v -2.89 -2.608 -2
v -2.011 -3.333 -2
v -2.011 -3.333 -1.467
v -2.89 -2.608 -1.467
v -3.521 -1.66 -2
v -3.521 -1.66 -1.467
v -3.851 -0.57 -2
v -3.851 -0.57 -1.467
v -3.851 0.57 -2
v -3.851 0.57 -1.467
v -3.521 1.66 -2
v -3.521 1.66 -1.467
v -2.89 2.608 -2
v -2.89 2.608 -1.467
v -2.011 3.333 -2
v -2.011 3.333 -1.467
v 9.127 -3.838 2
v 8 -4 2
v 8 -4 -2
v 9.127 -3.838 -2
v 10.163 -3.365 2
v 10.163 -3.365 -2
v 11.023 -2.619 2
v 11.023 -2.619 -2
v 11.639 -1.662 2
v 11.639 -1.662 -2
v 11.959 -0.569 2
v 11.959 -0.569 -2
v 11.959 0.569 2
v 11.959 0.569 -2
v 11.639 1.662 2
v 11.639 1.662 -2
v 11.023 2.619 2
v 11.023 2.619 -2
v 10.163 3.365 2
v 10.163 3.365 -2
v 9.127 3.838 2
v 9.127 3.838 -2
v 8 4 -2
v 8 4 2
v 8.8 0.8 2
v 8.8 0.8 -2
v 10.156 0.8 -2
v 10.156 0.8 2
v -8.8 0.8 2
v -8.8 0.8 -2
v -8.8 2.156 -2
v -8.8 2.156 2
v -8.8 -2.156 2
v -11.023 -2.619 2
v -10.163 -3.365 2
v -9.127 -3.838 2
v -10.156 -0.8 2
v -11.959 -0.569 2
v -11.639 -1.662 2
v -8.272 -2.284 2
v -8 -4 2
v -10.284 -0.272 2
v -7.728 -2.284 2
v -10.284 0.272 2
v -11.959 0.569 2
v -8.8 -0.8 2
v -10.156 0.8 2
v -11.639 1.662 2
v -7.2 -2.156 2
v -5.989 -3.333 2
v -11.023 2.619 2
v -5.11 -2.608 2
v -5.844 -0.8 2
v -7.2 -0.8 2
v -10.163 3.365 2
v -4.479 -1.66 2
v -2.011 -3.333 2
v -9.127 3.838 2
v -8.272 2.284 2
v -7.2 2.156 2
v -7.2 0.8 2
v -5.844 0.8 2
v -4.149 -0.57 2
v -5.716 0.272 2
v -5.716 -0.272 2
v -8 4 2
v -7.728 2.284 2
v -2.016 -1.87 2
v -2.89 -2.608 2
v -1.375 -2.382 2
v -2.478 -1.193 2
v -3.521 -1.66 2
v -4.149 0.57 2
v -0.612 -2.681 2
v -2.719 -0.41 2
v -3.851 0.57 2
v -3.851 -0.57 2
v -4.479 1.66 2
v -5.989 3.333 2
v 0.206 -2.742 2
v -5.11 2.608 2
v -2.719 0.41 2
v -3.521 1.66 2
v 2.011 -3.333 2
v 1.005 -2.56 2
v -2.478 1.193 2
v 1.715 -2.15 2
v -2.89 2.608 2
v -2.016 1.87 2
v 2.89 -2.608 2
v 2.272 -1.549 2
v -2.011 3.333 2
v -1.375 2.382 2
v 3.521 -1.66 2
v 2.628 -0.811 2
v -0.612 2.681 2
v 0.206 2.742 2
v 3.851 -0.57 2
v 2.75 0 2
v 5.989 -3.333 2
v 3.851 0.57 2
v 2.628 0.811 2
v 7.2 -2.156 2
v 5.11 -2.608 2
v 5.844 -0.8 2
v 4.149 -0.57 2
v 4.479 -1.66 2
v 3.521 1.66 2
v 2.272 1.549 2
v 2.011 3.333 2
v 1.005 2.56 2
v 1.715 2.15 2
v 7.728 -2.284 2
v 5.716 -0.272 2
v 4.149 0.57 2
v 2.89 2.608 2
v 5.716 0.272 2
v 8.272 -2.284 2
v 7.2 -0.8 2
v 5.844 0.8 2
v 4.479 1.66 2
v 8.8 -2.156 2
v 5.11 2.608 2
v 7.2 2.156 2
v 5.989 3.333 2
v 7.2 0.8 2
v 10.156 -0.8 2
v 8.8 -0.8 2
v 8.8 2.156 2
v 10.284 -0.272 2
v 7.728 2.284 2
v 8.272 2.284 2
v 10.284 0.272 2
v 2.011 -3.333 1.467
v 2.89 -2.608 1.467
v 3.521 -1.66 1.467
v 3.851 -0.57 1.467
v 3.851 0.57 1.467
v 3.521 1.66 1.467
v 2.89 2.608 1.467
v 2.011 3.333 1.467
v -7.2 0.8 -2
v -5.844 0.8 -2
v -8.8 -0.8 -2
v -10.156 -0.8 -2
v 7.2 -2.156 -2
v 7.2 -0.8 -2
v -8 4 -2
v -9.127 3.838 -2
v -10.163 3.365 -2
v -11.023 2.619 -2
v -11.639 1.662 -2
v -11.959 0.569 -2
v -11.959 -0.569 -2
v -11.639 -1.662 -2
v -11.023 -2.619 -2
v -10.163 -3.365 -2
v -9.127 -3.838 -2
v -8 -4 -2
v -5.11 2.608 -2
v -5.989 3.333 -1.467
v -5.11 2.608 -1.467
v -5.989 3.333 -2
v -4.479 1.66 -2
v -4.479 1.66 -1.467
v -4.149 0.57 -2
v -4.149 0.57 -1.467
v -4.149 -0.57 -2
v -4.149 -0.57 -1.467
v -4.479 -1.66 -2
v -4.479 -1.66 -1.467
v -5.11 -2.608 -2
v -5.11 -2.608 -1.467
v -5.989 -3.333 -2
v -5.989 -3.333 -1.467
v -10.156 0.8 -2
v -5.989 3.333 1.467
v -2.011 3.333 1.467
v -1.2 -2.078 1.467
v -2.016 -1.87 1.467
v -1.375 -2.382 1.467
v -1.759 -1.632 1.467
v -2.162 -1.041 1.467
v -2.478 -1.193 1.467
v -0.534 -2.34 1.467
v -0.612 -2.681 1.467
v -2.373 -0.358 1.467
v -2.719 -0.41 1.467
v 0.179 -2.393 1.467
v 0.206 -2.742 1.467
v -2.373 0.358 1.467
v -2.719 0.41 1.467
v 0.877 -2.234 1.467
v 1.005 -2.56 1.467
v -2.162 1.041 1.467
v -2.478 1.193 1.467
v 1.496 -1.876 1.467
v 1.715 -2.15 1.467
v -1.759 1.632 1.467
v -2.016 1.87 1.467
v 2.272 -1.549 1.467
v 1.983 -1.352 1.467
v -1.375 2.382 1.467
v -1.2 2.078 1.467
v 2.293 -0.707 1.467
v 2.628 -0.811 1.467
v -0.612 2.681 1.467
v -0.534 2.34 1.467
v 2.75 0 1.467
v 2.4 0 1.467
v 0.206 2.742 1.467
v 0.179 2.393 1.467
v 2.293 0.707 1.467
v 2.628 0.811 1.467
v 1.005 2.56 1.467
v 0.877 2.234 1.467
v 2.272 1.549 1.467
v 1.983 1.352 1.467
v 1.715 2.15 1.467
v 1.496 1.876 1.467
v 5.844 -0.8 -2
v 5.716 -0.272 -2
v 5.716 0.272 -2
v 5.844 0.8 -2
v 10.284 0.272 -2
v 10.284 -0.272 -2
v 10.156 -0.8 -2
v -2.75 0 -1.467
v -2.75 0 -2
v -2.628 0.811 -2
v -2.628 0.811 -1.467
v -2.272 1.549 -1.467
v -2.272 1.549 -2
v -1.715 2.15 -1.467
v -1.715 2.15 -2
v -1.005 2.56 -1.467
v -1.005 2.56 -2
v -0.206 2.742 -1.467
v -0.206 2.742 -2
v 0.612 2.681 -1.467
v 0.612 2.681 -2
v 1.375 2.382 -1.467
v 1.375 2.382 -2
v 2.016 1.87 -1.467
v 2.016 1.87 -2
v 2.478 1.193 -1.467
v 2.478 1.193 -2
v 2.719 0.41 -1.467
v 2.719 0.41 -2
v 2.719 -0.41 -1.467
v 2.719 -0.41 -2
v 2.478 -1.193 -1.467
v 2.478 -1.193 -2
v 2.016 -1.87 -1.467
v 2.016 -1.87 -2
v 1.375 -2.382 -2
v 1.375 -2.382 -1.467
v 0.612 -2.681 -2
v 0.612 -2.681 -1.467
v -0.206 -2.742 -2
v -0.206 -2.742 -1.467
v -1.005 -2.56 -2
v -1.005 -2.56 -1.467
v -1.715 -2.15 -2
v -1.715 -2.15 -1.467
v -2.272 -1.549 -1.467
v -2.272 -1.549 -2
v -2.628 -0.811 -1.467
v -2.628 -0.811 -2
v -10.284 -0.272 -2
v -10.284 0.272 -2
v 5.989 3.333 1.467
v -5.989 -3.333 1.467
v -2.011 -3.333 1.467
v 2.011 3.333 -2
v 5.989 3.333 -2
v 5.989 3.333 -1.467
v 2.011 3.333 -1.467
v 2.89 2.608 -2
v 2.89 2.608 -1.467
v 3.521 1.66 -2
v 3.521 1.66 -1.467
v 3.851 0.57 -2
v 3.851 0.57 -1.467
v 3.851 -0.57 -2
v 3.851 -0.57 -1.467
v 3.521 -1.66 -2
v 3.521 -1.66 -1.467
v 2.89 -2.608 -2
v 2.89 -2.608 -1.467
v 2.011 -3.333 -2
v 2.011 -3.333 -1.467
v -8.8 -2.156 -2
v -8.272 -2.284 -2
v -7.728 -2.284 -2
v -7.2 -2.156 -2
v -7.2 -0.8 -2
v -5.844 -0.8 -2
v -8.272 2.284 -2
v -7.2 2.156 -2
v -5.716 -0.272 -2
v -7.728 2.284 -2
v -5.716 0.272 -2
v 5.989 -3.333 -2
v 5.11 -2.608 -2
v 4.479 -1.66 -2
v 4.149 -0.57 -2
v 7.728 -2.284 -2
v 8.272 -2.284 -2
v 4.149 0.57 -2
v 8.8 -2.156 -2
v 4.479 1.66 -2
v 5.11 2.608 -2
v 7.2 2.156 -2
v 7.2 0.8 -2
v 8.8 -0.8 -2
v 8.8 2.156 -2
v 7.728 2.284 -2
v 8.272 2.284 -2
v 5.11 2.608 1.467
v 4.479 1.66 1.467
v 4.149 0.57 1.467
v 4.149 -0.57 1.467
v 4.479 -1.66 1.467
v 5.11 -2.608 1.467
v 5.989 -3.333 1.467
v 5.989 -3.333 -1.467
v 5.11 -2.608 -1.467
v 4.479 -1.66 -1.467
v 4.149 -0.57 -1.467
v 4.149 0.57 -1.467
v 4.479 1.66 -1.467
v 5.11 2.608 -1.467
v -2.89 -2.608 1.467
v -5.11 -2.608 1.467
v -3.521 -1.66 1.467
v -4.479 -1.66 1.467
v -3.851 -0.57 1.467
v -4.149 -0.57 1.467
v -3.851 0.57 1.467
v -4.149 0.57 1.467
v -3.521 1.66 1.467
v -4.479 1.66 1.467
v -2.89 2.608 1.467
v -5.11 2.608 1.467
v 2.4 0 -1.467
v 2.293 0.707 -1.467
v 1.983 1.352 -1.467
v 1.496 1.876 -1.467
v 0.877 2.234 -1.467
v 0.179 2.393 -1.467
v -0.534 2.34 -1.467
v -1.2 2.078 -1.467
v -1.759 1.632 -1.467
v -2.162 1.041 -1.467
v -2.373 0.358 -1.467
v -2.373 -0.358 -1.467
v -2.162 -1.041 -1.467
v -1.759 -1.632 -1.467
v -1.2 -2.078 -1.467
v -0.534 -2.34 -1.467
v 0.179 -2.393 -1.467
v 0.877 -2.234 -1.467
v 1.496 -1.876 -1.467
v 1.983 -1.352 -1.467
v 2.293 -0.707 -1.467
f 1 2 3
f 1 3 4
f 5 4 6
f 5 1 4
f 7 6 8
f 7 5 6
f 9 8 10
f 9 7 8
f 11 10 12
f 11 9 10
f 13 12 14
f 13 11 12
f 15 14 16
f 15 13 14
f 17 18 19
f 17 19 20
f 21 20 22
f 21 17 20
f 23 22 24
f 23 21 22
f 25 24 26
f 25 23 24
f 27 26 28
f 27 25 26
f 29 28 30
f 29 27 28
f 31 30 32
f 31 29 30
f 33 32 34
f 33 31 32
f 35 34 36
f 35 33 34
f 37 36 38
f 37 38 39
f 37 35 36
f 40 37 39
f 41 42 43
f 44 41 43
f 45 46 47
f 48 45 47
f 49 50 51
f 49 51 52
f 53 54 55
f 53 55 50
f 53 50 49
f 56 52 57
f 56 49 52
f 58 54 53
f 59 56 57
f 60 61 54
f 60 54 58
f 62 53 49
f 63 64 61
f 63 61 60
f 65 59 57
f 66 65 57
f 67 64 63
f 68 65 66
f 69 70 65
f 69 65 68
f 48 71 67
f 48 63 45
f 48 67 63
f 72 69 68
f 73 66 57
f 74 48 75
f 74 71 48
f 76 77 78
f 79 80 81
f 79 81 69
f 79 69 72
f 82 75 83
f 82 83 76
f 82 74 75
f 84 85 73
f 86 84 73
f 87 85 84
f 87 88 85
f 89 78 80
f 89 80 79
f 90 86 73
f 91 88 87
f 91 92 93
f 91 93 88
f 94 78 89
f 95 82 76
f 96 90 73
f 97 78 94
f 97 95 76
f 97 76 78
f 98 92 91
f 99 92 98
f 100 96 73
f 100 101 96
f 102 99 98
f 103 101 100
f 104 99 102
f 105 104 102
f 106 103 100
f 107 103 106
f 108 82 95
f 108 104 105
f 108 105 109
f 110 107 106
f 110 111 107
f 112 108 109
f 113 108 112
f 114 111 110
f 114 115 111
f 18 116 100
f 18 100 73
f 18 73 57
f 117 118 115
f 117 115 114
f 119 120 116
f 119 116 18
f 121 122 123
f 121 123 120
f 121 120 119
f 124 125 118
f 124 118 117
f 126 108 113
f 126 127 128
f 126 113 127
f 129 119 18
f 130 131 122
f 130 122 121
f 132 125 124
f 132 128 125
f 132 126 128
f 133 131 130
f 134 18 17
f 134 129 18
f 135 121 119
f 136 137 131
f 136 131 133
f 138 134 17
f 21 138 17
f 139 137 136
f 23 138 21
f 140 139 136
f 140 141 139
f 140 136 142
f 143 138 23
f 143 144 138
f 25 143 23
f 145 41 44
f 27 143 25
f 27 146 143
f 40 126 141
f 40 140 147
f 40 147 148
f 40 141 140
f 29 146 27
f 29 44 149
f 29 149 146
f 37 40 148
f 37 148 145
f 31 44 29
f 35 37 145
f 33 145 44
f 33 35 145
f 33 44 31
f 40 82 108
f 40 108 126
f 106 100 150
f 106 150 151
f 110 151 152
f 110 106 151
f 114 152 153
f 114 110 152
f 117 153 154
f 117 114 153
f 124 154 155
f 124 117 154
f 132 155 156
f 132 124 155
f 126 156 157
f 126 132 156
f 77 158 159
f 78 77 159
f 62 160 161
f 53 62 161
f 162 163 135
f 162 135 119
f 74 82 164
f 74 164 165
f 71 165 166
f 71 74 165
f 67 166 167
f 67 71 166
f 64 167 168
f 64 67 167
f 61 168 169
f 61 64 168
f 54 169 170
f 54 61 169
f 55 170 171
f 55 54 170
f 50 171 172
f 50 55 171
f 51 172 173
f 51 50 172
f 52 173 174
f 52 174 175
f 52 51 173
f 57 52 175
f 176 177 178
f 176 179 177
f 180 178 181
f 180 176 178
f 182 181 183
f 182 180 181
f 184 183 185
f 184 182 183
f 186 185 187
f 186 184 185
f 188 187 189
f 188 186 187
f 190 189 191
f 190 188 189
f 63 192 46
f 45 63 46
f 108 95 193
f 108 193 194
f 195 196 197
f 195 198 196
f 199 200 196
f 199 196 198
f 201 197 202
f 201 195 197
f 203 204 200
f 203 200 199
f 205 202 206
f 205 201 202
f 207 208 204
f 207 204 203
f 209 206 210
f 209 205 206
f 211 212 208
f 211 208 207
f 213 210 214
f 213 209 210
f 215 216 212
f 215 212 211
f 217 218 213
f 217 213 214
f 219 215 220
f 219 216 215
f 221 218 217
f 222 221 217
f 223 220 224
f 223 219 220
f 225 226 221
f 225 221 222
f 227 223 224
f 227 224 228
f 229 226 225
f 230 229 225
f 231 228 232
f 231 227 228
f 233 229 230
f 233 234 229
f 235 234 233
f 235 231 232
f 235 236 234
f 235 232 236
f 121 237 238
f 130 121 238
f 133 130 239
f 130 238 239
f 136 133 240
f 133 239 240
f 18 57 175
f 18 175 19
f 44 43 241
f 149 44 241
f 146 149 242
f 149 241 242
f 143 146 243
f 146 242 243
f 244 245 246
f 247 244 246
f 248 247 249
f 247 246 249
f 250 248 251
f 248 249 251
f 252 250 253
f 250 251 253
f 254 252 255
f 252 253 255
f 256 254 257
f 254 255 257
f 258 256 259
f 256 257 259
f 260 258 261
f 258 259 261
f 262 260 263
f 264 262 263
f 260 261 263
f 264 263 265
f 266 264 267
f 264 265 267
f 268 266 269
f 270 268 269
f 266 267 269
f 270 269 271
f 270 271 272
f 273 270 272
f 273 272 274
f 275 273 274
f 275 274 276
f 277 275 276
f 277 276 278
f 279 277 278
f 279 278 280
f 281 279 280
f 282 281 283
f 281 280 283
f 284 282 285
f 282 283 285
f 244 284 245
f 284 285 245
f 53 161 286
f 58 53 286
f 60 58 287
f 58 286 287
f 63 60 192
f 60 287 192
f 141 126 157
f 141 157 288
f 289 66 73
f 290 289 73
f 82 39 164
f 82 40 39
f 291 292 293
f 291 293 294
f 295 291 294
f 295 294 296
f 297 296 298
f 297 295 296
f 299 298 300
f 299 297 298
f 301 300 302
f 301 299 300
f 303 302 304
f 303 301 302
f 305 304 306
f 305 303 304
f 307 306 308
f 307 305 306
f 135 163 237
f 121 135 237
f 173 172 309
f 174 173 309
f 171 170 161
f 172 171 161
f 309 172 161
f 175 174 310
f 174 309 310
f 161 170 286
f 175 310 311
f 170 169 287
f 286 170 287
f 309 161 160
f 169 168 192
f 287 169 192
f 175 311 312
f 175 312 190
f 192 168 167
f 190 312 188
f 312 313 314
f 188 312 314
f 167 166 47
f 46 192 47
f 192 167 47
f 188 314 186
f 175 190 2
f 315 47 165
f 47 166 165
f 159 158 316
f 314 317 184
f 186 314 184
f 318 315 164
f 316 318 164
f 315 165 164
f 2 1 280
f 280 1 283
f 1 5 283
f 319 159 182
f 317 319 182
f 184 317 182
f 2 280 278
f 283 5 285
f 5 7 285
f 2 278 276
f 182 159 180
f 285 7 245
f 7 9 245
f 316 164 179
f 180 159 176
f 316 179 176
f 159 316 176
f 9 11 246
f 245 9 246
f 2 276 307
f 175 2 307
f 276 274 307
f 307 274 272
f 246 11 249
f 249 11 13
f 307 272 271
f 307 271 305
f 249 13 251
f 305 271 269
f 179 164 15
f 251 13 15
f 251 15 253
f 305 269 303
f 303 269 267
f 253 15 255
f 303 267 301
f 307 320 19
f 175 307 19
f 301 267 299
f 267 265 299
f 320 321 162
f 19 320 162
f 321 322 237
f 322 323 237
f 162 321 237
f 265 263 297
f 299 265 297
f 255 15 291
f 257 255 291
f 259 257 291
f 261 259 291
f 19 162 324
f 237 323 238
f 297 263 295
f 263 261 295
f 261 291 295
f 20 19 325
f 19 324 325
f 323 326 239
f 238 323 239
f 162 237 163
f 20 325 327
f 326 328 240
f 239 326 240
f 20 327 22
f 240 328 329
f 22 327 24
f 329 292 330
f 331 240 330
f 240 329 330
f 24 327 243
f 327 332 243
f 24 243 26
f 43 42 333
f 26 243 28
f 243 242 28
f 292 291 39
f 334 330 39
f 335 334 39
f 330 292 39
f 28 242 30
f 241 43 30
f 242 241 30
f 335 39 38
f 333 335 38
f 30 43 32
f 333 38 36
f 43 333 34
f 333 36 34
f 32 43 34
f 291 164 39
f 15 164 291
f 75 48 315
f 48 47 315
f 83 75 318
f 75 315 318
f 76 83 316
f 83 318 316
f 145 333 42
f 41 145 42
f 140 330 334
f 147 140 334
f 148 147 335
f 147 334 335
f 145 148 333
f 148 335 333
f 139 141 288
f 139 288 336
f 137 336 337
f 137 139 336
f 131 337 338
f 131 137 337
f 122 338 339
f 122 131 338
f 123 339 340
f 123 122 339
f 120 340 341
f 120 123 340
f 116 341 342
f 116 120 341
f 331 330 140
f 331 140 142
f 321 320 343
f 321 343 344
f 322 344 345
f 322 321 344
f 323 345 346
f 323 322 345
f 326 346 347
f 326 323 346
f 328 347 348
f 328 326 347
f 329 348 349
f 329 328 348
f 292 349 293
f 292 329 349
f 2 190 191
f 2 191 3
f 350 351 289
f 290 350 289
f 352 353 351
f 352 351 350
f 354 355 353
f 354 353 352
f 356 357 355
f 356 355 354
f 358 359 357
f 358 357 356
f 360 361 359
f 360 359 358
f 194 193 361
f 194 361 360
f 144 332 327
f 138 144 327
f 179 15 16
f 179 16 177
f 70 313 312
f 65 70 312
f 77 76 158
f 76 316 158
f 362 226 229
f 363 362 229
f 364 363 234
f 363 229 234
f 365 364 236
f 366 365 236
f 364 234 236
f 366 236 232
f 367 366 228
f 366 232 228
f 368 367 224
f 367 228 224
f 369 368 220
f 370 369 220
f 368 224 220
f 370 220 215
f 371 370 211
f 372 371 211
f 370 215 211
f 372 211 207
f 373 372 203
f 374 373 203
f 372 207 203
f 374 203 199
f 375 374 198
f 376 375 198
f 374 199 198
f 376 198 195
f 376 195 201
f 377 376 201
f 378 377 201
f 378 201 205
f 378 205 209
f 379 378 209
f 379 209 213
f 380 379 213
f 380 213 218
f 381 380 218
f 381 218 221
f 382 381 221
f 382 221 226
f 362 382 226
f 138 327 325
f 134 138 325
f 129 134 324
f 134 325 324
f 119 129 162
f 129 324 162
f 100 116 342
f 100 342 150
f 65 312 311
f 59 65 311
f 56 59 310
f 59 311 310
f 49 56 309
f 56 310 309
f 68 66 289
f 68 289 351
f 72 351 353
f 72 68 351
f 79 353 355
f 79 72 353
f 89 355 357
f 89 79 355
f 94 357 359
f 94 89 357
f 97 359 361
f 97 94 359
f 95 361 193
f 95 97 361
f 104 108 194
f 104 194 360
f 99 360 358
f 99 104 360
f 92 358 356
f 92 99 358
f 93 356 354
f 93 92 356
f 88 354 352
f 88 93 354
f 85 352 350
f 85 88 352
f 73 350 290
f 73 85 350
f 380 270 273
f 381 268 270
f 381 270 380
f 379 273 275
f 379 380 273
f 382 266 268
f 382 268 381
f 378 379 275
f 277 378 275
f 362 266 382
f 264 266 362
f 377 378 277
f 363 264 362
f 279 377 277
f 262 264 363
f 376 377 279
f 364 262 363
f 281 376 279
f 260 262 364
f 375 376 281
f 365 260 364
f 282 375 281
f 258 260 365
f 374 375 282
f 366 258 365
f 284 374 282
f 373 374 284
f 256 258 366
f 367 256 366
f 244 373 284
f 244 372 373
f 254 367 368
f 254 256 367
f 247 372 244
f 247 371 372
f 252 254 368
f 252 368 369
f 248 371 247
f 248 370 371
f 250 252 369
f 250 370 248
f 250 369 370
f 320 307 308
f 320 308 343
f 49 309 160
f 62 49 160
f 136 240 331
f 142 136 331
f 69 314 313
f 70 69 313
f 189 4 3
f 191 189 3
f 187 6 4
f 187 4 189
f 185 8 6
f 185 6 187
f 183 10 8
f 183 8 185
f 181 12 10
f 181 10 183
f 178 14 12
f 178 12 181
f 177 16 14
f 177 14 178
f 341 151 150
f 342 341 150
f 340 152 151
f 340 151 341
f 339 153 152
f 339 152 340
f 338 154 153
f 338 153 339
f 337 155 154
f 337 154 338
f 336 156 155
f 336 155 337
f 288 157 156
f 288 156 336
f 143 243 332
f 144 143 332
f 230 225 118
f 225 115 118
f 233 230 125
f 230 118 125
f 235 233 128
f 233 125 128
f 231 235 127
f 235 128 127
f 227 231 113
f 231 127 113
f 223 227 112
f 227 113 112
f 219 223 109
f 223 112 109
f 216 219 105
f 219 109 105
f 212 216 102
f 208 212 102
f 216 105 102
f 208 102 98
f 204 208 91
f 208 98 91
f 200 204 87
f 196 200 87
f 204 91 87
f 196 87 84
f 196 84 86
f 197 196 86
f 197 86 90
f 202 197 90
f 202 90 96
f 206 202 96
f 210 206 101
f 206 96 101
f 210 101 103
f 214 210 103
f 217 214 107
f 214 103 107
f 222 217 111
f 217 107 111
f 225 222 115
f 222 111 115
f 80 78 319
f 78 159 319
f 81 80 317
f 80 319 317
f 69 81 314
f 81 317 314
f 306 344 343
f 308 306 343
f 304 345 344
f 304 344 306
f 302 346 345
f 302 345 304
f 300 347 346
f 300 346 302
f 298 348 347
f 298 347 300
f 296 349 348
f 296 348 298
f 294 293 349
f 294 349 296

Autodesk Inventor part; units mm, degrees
ref_plane "YZ Plane" through (0, 0, 0) normal (1, 0, 0) x (0, 1, 0)
ref_plane "XZ Plane" through (0, 0, 0) normal (0, 1, 0) x (-1, 0, 0)
ref_plane "XY Plane" through (0, 0, 0) normal (0, 0, 1) x (1, 0, 0)
sketch "Sketch1" plane through (0, 0, 0) normal (0, 0, 1) x (1, 0, 0)
  line L0 (0, -5.6) -> (0, 5.6) construction
  line L1 (-16.8, 0) -> (16.8, 0) construction
  line L2 (8, 4) -> (-8, 4)
  arc A0 (-8, 4) -> (-8, -4) centre (-8, 0) ccw
  line L3 (-8, -4) -> (8, -4)
  arc A1 (8, -4) -> (8, 4) centre (8, 0) ccw
  circle A2 centre (0, 0) radius 2.75
  circle A3 centre (0, 0) radius 2.4
  point P0 (0, 4)
  dimension "d0" = 24
  dimension "d1" = 8
  dimension "d27" = 4.8
  dimension "d28" = 5.5
sketch "Sketch6" plane through (0, 0, 0) normal (0, 0, 1) x (1, 0, 0)
  arc A0 (-8, 4) -> (-8, -4) centre (-8, 0) ccw construction
  arc A1 (8, -4) -> (8, 4) centre (8, 0) ccw construction
  circle A2 centre (-8, 0) radius 2.3
  circle A3 centre (8, 0) radius 2.3
  line L0 (-10.1564, 0.8) -> (-8.8, 0.8)
  line L1 (-8.8, 0.8) -> (-8.8, 2.1564)
  line L2 (-7.2, 2.1564) -> (-7.2, 0.8)
  line L3 (-7.2, 0.8) -> (-5.8436, 0.8)
  line L4 (-5.8436, -0.8) -> (-7.2, -0.8)
  line L5 (-7.2, -0.8) -> (-7.2, -2.1564)
  line L6 (-8.8, -2.1564) -> (-8.8, -0.8)
  line L7 (-8.8, -0.8) -> (-10.1564, -0.8)
  line L8 (5.8436, 0.8) -> (7.2, 0.8)
  line L9 (8.8, 0.8) -> (10.1564, 0.8)
  line L10 (8.8, 2.1564) -> (8.8, 0.8)
  line L11 (8.8, -0.8) -> (8.8, -2.1564)
  line L12 (7.2, 2.1564) -> (7.2, 0.8)
  line L13 (7.2, -0.8) -> (7.2, -2.1564)
  line L14 (10.1564, -0.8) -> (8.8, -0.8)
  line L15 (7.2, -0.8) -> (5.8436, -0.8)
  dimension "d29" = 4.6
  dimension "d30" = 1.6
extrude "Extrusion1" add sketch "Sketch1" along normal mid plane 4 contours A1 L3 A0 L2 | A2 | A3
extrude "Extrusion2" cut sketch "Sketch1" along normal through all both and the other way through all contours A3
sketch "Sketch2" plane through (0, 0, 2) normal (0, 0, 1) x (1, 0, 0)
  circle A0 centre (0, 0) radius 2.75 projected
extrude "Extrusion3" cut sketch "Sketch2" against normal blind 0.5333
sketch "Sketch3" plane through (0, 0, -2) normal (0, 0, -1) x (-1, 0, 0)
  circle A0 centre (0, 0) radius 2.75 projected
extrude "Extrusion4" cut sketch "Sketch3" against normal blind 0.5333
extrude "Extrusion7" cut sketch "Sketch6" along normal through all both and the other way through all contours A2 L4 L5 L6 L7 L0 L1 L2 L3 | A3 L14 L11 L13 L15 L8 L12 L10 L9
sketch "Sketch4" plane through (0, 0, 2) normal (0, 0, 1) x (1, 0, 0)
  circle A0 centre (-8, 0) radius 2.3 construction
  circle A1 centre (8, 0) radius 2.3 construction
  arc A2 (5.9892, 3.3333) -> (5.9892, -3.3333) centre (8, 0) ccw
  line L0 (2.0108, 3.3333) -> (5.9892, 3.3333)
  line L1 (5.9892, -3.3333) -> (2.0108, -3.3333)
  arc A3 (-5.9892, -3.3333) -> (-5.9892, 3.3333) centre (-8, 0) ccw
  line L2 (-5.9892, 3.3333) -> (-2.0108, 3.3333)
  line L3 (-5.9892, -3.3333) -> (-2.0108, -3.3333)
  arc A4 (2.0108, -3.3333) -> (2.0108, 3.3333) centre (0, 0) ccw
  arc A5 (-2.0108, 3.3333) -> (-2.0108, -3.3333) centre (0, 0) ccw
  circle A6 centre (0, 0) radius 2.75 construction
  dimension "d33" = 6.6667
  dimension "d35" = 1.1429
extrude "Extrusion5" cut sketch "Sketch4" against normal blind 0.5333
sketch "Sketch7" plane through (0, 0, -2) normal (0, 0, -1) x (-1, 0, 0)
  arc A0 (5.9892, 3.3333) -> (5.9892, -3.3333) centre (8, 0) ccw projected
  line L0 (5.9892, -3.3333) -> (2.0108, -3.3333) projected
  arc A1 (2.0108, -3.3333) -> (2.0108, 3.3333) centre (0, 0) ccw projected
  line L1 (2.0108, 3.3333) -> (5.9892, 3.3333) projected
  arc A2 (-2.0108, 3.3333) -> (-2.0108, -3.3333) centre (0, 0) ccw projected
  line L2 (-2.0108, -3.3333) -> (-5.9892, -3.3333) projected
  arc A3 (-5.9892, -3.3333) -> (-5.9892, 3.3333) centre (-8, 0) ccw projected
  line L3 (-5.9892, 3.3333) -> (-2.0108, 3.3333) projected
extrude "Extrusion8" cut sketch "Sketch7" against normal blind 0.5333
equation "\"d1\" = width_standard"
equation "\"d2\" = 0.5 * width_standard"
equation "\"d6\" = 0.333333 * height_standard"
equation "\"d13\" = 0.0555556 * height_standard"
equation "\"d15\" = 0.0555556 * height_standard"
equation "\"d33\" = 0.833333 * width_standard"
equation "\"d20\" = 0.0555556 * height_standard"
equation "\"d36\" = 0.0555556 * height_standard"
equation "\"width_standard\" = 8"
equation "\"height_standard\" = 9.6"
properties part number "LEGO Brick 32017" material "Steel"
